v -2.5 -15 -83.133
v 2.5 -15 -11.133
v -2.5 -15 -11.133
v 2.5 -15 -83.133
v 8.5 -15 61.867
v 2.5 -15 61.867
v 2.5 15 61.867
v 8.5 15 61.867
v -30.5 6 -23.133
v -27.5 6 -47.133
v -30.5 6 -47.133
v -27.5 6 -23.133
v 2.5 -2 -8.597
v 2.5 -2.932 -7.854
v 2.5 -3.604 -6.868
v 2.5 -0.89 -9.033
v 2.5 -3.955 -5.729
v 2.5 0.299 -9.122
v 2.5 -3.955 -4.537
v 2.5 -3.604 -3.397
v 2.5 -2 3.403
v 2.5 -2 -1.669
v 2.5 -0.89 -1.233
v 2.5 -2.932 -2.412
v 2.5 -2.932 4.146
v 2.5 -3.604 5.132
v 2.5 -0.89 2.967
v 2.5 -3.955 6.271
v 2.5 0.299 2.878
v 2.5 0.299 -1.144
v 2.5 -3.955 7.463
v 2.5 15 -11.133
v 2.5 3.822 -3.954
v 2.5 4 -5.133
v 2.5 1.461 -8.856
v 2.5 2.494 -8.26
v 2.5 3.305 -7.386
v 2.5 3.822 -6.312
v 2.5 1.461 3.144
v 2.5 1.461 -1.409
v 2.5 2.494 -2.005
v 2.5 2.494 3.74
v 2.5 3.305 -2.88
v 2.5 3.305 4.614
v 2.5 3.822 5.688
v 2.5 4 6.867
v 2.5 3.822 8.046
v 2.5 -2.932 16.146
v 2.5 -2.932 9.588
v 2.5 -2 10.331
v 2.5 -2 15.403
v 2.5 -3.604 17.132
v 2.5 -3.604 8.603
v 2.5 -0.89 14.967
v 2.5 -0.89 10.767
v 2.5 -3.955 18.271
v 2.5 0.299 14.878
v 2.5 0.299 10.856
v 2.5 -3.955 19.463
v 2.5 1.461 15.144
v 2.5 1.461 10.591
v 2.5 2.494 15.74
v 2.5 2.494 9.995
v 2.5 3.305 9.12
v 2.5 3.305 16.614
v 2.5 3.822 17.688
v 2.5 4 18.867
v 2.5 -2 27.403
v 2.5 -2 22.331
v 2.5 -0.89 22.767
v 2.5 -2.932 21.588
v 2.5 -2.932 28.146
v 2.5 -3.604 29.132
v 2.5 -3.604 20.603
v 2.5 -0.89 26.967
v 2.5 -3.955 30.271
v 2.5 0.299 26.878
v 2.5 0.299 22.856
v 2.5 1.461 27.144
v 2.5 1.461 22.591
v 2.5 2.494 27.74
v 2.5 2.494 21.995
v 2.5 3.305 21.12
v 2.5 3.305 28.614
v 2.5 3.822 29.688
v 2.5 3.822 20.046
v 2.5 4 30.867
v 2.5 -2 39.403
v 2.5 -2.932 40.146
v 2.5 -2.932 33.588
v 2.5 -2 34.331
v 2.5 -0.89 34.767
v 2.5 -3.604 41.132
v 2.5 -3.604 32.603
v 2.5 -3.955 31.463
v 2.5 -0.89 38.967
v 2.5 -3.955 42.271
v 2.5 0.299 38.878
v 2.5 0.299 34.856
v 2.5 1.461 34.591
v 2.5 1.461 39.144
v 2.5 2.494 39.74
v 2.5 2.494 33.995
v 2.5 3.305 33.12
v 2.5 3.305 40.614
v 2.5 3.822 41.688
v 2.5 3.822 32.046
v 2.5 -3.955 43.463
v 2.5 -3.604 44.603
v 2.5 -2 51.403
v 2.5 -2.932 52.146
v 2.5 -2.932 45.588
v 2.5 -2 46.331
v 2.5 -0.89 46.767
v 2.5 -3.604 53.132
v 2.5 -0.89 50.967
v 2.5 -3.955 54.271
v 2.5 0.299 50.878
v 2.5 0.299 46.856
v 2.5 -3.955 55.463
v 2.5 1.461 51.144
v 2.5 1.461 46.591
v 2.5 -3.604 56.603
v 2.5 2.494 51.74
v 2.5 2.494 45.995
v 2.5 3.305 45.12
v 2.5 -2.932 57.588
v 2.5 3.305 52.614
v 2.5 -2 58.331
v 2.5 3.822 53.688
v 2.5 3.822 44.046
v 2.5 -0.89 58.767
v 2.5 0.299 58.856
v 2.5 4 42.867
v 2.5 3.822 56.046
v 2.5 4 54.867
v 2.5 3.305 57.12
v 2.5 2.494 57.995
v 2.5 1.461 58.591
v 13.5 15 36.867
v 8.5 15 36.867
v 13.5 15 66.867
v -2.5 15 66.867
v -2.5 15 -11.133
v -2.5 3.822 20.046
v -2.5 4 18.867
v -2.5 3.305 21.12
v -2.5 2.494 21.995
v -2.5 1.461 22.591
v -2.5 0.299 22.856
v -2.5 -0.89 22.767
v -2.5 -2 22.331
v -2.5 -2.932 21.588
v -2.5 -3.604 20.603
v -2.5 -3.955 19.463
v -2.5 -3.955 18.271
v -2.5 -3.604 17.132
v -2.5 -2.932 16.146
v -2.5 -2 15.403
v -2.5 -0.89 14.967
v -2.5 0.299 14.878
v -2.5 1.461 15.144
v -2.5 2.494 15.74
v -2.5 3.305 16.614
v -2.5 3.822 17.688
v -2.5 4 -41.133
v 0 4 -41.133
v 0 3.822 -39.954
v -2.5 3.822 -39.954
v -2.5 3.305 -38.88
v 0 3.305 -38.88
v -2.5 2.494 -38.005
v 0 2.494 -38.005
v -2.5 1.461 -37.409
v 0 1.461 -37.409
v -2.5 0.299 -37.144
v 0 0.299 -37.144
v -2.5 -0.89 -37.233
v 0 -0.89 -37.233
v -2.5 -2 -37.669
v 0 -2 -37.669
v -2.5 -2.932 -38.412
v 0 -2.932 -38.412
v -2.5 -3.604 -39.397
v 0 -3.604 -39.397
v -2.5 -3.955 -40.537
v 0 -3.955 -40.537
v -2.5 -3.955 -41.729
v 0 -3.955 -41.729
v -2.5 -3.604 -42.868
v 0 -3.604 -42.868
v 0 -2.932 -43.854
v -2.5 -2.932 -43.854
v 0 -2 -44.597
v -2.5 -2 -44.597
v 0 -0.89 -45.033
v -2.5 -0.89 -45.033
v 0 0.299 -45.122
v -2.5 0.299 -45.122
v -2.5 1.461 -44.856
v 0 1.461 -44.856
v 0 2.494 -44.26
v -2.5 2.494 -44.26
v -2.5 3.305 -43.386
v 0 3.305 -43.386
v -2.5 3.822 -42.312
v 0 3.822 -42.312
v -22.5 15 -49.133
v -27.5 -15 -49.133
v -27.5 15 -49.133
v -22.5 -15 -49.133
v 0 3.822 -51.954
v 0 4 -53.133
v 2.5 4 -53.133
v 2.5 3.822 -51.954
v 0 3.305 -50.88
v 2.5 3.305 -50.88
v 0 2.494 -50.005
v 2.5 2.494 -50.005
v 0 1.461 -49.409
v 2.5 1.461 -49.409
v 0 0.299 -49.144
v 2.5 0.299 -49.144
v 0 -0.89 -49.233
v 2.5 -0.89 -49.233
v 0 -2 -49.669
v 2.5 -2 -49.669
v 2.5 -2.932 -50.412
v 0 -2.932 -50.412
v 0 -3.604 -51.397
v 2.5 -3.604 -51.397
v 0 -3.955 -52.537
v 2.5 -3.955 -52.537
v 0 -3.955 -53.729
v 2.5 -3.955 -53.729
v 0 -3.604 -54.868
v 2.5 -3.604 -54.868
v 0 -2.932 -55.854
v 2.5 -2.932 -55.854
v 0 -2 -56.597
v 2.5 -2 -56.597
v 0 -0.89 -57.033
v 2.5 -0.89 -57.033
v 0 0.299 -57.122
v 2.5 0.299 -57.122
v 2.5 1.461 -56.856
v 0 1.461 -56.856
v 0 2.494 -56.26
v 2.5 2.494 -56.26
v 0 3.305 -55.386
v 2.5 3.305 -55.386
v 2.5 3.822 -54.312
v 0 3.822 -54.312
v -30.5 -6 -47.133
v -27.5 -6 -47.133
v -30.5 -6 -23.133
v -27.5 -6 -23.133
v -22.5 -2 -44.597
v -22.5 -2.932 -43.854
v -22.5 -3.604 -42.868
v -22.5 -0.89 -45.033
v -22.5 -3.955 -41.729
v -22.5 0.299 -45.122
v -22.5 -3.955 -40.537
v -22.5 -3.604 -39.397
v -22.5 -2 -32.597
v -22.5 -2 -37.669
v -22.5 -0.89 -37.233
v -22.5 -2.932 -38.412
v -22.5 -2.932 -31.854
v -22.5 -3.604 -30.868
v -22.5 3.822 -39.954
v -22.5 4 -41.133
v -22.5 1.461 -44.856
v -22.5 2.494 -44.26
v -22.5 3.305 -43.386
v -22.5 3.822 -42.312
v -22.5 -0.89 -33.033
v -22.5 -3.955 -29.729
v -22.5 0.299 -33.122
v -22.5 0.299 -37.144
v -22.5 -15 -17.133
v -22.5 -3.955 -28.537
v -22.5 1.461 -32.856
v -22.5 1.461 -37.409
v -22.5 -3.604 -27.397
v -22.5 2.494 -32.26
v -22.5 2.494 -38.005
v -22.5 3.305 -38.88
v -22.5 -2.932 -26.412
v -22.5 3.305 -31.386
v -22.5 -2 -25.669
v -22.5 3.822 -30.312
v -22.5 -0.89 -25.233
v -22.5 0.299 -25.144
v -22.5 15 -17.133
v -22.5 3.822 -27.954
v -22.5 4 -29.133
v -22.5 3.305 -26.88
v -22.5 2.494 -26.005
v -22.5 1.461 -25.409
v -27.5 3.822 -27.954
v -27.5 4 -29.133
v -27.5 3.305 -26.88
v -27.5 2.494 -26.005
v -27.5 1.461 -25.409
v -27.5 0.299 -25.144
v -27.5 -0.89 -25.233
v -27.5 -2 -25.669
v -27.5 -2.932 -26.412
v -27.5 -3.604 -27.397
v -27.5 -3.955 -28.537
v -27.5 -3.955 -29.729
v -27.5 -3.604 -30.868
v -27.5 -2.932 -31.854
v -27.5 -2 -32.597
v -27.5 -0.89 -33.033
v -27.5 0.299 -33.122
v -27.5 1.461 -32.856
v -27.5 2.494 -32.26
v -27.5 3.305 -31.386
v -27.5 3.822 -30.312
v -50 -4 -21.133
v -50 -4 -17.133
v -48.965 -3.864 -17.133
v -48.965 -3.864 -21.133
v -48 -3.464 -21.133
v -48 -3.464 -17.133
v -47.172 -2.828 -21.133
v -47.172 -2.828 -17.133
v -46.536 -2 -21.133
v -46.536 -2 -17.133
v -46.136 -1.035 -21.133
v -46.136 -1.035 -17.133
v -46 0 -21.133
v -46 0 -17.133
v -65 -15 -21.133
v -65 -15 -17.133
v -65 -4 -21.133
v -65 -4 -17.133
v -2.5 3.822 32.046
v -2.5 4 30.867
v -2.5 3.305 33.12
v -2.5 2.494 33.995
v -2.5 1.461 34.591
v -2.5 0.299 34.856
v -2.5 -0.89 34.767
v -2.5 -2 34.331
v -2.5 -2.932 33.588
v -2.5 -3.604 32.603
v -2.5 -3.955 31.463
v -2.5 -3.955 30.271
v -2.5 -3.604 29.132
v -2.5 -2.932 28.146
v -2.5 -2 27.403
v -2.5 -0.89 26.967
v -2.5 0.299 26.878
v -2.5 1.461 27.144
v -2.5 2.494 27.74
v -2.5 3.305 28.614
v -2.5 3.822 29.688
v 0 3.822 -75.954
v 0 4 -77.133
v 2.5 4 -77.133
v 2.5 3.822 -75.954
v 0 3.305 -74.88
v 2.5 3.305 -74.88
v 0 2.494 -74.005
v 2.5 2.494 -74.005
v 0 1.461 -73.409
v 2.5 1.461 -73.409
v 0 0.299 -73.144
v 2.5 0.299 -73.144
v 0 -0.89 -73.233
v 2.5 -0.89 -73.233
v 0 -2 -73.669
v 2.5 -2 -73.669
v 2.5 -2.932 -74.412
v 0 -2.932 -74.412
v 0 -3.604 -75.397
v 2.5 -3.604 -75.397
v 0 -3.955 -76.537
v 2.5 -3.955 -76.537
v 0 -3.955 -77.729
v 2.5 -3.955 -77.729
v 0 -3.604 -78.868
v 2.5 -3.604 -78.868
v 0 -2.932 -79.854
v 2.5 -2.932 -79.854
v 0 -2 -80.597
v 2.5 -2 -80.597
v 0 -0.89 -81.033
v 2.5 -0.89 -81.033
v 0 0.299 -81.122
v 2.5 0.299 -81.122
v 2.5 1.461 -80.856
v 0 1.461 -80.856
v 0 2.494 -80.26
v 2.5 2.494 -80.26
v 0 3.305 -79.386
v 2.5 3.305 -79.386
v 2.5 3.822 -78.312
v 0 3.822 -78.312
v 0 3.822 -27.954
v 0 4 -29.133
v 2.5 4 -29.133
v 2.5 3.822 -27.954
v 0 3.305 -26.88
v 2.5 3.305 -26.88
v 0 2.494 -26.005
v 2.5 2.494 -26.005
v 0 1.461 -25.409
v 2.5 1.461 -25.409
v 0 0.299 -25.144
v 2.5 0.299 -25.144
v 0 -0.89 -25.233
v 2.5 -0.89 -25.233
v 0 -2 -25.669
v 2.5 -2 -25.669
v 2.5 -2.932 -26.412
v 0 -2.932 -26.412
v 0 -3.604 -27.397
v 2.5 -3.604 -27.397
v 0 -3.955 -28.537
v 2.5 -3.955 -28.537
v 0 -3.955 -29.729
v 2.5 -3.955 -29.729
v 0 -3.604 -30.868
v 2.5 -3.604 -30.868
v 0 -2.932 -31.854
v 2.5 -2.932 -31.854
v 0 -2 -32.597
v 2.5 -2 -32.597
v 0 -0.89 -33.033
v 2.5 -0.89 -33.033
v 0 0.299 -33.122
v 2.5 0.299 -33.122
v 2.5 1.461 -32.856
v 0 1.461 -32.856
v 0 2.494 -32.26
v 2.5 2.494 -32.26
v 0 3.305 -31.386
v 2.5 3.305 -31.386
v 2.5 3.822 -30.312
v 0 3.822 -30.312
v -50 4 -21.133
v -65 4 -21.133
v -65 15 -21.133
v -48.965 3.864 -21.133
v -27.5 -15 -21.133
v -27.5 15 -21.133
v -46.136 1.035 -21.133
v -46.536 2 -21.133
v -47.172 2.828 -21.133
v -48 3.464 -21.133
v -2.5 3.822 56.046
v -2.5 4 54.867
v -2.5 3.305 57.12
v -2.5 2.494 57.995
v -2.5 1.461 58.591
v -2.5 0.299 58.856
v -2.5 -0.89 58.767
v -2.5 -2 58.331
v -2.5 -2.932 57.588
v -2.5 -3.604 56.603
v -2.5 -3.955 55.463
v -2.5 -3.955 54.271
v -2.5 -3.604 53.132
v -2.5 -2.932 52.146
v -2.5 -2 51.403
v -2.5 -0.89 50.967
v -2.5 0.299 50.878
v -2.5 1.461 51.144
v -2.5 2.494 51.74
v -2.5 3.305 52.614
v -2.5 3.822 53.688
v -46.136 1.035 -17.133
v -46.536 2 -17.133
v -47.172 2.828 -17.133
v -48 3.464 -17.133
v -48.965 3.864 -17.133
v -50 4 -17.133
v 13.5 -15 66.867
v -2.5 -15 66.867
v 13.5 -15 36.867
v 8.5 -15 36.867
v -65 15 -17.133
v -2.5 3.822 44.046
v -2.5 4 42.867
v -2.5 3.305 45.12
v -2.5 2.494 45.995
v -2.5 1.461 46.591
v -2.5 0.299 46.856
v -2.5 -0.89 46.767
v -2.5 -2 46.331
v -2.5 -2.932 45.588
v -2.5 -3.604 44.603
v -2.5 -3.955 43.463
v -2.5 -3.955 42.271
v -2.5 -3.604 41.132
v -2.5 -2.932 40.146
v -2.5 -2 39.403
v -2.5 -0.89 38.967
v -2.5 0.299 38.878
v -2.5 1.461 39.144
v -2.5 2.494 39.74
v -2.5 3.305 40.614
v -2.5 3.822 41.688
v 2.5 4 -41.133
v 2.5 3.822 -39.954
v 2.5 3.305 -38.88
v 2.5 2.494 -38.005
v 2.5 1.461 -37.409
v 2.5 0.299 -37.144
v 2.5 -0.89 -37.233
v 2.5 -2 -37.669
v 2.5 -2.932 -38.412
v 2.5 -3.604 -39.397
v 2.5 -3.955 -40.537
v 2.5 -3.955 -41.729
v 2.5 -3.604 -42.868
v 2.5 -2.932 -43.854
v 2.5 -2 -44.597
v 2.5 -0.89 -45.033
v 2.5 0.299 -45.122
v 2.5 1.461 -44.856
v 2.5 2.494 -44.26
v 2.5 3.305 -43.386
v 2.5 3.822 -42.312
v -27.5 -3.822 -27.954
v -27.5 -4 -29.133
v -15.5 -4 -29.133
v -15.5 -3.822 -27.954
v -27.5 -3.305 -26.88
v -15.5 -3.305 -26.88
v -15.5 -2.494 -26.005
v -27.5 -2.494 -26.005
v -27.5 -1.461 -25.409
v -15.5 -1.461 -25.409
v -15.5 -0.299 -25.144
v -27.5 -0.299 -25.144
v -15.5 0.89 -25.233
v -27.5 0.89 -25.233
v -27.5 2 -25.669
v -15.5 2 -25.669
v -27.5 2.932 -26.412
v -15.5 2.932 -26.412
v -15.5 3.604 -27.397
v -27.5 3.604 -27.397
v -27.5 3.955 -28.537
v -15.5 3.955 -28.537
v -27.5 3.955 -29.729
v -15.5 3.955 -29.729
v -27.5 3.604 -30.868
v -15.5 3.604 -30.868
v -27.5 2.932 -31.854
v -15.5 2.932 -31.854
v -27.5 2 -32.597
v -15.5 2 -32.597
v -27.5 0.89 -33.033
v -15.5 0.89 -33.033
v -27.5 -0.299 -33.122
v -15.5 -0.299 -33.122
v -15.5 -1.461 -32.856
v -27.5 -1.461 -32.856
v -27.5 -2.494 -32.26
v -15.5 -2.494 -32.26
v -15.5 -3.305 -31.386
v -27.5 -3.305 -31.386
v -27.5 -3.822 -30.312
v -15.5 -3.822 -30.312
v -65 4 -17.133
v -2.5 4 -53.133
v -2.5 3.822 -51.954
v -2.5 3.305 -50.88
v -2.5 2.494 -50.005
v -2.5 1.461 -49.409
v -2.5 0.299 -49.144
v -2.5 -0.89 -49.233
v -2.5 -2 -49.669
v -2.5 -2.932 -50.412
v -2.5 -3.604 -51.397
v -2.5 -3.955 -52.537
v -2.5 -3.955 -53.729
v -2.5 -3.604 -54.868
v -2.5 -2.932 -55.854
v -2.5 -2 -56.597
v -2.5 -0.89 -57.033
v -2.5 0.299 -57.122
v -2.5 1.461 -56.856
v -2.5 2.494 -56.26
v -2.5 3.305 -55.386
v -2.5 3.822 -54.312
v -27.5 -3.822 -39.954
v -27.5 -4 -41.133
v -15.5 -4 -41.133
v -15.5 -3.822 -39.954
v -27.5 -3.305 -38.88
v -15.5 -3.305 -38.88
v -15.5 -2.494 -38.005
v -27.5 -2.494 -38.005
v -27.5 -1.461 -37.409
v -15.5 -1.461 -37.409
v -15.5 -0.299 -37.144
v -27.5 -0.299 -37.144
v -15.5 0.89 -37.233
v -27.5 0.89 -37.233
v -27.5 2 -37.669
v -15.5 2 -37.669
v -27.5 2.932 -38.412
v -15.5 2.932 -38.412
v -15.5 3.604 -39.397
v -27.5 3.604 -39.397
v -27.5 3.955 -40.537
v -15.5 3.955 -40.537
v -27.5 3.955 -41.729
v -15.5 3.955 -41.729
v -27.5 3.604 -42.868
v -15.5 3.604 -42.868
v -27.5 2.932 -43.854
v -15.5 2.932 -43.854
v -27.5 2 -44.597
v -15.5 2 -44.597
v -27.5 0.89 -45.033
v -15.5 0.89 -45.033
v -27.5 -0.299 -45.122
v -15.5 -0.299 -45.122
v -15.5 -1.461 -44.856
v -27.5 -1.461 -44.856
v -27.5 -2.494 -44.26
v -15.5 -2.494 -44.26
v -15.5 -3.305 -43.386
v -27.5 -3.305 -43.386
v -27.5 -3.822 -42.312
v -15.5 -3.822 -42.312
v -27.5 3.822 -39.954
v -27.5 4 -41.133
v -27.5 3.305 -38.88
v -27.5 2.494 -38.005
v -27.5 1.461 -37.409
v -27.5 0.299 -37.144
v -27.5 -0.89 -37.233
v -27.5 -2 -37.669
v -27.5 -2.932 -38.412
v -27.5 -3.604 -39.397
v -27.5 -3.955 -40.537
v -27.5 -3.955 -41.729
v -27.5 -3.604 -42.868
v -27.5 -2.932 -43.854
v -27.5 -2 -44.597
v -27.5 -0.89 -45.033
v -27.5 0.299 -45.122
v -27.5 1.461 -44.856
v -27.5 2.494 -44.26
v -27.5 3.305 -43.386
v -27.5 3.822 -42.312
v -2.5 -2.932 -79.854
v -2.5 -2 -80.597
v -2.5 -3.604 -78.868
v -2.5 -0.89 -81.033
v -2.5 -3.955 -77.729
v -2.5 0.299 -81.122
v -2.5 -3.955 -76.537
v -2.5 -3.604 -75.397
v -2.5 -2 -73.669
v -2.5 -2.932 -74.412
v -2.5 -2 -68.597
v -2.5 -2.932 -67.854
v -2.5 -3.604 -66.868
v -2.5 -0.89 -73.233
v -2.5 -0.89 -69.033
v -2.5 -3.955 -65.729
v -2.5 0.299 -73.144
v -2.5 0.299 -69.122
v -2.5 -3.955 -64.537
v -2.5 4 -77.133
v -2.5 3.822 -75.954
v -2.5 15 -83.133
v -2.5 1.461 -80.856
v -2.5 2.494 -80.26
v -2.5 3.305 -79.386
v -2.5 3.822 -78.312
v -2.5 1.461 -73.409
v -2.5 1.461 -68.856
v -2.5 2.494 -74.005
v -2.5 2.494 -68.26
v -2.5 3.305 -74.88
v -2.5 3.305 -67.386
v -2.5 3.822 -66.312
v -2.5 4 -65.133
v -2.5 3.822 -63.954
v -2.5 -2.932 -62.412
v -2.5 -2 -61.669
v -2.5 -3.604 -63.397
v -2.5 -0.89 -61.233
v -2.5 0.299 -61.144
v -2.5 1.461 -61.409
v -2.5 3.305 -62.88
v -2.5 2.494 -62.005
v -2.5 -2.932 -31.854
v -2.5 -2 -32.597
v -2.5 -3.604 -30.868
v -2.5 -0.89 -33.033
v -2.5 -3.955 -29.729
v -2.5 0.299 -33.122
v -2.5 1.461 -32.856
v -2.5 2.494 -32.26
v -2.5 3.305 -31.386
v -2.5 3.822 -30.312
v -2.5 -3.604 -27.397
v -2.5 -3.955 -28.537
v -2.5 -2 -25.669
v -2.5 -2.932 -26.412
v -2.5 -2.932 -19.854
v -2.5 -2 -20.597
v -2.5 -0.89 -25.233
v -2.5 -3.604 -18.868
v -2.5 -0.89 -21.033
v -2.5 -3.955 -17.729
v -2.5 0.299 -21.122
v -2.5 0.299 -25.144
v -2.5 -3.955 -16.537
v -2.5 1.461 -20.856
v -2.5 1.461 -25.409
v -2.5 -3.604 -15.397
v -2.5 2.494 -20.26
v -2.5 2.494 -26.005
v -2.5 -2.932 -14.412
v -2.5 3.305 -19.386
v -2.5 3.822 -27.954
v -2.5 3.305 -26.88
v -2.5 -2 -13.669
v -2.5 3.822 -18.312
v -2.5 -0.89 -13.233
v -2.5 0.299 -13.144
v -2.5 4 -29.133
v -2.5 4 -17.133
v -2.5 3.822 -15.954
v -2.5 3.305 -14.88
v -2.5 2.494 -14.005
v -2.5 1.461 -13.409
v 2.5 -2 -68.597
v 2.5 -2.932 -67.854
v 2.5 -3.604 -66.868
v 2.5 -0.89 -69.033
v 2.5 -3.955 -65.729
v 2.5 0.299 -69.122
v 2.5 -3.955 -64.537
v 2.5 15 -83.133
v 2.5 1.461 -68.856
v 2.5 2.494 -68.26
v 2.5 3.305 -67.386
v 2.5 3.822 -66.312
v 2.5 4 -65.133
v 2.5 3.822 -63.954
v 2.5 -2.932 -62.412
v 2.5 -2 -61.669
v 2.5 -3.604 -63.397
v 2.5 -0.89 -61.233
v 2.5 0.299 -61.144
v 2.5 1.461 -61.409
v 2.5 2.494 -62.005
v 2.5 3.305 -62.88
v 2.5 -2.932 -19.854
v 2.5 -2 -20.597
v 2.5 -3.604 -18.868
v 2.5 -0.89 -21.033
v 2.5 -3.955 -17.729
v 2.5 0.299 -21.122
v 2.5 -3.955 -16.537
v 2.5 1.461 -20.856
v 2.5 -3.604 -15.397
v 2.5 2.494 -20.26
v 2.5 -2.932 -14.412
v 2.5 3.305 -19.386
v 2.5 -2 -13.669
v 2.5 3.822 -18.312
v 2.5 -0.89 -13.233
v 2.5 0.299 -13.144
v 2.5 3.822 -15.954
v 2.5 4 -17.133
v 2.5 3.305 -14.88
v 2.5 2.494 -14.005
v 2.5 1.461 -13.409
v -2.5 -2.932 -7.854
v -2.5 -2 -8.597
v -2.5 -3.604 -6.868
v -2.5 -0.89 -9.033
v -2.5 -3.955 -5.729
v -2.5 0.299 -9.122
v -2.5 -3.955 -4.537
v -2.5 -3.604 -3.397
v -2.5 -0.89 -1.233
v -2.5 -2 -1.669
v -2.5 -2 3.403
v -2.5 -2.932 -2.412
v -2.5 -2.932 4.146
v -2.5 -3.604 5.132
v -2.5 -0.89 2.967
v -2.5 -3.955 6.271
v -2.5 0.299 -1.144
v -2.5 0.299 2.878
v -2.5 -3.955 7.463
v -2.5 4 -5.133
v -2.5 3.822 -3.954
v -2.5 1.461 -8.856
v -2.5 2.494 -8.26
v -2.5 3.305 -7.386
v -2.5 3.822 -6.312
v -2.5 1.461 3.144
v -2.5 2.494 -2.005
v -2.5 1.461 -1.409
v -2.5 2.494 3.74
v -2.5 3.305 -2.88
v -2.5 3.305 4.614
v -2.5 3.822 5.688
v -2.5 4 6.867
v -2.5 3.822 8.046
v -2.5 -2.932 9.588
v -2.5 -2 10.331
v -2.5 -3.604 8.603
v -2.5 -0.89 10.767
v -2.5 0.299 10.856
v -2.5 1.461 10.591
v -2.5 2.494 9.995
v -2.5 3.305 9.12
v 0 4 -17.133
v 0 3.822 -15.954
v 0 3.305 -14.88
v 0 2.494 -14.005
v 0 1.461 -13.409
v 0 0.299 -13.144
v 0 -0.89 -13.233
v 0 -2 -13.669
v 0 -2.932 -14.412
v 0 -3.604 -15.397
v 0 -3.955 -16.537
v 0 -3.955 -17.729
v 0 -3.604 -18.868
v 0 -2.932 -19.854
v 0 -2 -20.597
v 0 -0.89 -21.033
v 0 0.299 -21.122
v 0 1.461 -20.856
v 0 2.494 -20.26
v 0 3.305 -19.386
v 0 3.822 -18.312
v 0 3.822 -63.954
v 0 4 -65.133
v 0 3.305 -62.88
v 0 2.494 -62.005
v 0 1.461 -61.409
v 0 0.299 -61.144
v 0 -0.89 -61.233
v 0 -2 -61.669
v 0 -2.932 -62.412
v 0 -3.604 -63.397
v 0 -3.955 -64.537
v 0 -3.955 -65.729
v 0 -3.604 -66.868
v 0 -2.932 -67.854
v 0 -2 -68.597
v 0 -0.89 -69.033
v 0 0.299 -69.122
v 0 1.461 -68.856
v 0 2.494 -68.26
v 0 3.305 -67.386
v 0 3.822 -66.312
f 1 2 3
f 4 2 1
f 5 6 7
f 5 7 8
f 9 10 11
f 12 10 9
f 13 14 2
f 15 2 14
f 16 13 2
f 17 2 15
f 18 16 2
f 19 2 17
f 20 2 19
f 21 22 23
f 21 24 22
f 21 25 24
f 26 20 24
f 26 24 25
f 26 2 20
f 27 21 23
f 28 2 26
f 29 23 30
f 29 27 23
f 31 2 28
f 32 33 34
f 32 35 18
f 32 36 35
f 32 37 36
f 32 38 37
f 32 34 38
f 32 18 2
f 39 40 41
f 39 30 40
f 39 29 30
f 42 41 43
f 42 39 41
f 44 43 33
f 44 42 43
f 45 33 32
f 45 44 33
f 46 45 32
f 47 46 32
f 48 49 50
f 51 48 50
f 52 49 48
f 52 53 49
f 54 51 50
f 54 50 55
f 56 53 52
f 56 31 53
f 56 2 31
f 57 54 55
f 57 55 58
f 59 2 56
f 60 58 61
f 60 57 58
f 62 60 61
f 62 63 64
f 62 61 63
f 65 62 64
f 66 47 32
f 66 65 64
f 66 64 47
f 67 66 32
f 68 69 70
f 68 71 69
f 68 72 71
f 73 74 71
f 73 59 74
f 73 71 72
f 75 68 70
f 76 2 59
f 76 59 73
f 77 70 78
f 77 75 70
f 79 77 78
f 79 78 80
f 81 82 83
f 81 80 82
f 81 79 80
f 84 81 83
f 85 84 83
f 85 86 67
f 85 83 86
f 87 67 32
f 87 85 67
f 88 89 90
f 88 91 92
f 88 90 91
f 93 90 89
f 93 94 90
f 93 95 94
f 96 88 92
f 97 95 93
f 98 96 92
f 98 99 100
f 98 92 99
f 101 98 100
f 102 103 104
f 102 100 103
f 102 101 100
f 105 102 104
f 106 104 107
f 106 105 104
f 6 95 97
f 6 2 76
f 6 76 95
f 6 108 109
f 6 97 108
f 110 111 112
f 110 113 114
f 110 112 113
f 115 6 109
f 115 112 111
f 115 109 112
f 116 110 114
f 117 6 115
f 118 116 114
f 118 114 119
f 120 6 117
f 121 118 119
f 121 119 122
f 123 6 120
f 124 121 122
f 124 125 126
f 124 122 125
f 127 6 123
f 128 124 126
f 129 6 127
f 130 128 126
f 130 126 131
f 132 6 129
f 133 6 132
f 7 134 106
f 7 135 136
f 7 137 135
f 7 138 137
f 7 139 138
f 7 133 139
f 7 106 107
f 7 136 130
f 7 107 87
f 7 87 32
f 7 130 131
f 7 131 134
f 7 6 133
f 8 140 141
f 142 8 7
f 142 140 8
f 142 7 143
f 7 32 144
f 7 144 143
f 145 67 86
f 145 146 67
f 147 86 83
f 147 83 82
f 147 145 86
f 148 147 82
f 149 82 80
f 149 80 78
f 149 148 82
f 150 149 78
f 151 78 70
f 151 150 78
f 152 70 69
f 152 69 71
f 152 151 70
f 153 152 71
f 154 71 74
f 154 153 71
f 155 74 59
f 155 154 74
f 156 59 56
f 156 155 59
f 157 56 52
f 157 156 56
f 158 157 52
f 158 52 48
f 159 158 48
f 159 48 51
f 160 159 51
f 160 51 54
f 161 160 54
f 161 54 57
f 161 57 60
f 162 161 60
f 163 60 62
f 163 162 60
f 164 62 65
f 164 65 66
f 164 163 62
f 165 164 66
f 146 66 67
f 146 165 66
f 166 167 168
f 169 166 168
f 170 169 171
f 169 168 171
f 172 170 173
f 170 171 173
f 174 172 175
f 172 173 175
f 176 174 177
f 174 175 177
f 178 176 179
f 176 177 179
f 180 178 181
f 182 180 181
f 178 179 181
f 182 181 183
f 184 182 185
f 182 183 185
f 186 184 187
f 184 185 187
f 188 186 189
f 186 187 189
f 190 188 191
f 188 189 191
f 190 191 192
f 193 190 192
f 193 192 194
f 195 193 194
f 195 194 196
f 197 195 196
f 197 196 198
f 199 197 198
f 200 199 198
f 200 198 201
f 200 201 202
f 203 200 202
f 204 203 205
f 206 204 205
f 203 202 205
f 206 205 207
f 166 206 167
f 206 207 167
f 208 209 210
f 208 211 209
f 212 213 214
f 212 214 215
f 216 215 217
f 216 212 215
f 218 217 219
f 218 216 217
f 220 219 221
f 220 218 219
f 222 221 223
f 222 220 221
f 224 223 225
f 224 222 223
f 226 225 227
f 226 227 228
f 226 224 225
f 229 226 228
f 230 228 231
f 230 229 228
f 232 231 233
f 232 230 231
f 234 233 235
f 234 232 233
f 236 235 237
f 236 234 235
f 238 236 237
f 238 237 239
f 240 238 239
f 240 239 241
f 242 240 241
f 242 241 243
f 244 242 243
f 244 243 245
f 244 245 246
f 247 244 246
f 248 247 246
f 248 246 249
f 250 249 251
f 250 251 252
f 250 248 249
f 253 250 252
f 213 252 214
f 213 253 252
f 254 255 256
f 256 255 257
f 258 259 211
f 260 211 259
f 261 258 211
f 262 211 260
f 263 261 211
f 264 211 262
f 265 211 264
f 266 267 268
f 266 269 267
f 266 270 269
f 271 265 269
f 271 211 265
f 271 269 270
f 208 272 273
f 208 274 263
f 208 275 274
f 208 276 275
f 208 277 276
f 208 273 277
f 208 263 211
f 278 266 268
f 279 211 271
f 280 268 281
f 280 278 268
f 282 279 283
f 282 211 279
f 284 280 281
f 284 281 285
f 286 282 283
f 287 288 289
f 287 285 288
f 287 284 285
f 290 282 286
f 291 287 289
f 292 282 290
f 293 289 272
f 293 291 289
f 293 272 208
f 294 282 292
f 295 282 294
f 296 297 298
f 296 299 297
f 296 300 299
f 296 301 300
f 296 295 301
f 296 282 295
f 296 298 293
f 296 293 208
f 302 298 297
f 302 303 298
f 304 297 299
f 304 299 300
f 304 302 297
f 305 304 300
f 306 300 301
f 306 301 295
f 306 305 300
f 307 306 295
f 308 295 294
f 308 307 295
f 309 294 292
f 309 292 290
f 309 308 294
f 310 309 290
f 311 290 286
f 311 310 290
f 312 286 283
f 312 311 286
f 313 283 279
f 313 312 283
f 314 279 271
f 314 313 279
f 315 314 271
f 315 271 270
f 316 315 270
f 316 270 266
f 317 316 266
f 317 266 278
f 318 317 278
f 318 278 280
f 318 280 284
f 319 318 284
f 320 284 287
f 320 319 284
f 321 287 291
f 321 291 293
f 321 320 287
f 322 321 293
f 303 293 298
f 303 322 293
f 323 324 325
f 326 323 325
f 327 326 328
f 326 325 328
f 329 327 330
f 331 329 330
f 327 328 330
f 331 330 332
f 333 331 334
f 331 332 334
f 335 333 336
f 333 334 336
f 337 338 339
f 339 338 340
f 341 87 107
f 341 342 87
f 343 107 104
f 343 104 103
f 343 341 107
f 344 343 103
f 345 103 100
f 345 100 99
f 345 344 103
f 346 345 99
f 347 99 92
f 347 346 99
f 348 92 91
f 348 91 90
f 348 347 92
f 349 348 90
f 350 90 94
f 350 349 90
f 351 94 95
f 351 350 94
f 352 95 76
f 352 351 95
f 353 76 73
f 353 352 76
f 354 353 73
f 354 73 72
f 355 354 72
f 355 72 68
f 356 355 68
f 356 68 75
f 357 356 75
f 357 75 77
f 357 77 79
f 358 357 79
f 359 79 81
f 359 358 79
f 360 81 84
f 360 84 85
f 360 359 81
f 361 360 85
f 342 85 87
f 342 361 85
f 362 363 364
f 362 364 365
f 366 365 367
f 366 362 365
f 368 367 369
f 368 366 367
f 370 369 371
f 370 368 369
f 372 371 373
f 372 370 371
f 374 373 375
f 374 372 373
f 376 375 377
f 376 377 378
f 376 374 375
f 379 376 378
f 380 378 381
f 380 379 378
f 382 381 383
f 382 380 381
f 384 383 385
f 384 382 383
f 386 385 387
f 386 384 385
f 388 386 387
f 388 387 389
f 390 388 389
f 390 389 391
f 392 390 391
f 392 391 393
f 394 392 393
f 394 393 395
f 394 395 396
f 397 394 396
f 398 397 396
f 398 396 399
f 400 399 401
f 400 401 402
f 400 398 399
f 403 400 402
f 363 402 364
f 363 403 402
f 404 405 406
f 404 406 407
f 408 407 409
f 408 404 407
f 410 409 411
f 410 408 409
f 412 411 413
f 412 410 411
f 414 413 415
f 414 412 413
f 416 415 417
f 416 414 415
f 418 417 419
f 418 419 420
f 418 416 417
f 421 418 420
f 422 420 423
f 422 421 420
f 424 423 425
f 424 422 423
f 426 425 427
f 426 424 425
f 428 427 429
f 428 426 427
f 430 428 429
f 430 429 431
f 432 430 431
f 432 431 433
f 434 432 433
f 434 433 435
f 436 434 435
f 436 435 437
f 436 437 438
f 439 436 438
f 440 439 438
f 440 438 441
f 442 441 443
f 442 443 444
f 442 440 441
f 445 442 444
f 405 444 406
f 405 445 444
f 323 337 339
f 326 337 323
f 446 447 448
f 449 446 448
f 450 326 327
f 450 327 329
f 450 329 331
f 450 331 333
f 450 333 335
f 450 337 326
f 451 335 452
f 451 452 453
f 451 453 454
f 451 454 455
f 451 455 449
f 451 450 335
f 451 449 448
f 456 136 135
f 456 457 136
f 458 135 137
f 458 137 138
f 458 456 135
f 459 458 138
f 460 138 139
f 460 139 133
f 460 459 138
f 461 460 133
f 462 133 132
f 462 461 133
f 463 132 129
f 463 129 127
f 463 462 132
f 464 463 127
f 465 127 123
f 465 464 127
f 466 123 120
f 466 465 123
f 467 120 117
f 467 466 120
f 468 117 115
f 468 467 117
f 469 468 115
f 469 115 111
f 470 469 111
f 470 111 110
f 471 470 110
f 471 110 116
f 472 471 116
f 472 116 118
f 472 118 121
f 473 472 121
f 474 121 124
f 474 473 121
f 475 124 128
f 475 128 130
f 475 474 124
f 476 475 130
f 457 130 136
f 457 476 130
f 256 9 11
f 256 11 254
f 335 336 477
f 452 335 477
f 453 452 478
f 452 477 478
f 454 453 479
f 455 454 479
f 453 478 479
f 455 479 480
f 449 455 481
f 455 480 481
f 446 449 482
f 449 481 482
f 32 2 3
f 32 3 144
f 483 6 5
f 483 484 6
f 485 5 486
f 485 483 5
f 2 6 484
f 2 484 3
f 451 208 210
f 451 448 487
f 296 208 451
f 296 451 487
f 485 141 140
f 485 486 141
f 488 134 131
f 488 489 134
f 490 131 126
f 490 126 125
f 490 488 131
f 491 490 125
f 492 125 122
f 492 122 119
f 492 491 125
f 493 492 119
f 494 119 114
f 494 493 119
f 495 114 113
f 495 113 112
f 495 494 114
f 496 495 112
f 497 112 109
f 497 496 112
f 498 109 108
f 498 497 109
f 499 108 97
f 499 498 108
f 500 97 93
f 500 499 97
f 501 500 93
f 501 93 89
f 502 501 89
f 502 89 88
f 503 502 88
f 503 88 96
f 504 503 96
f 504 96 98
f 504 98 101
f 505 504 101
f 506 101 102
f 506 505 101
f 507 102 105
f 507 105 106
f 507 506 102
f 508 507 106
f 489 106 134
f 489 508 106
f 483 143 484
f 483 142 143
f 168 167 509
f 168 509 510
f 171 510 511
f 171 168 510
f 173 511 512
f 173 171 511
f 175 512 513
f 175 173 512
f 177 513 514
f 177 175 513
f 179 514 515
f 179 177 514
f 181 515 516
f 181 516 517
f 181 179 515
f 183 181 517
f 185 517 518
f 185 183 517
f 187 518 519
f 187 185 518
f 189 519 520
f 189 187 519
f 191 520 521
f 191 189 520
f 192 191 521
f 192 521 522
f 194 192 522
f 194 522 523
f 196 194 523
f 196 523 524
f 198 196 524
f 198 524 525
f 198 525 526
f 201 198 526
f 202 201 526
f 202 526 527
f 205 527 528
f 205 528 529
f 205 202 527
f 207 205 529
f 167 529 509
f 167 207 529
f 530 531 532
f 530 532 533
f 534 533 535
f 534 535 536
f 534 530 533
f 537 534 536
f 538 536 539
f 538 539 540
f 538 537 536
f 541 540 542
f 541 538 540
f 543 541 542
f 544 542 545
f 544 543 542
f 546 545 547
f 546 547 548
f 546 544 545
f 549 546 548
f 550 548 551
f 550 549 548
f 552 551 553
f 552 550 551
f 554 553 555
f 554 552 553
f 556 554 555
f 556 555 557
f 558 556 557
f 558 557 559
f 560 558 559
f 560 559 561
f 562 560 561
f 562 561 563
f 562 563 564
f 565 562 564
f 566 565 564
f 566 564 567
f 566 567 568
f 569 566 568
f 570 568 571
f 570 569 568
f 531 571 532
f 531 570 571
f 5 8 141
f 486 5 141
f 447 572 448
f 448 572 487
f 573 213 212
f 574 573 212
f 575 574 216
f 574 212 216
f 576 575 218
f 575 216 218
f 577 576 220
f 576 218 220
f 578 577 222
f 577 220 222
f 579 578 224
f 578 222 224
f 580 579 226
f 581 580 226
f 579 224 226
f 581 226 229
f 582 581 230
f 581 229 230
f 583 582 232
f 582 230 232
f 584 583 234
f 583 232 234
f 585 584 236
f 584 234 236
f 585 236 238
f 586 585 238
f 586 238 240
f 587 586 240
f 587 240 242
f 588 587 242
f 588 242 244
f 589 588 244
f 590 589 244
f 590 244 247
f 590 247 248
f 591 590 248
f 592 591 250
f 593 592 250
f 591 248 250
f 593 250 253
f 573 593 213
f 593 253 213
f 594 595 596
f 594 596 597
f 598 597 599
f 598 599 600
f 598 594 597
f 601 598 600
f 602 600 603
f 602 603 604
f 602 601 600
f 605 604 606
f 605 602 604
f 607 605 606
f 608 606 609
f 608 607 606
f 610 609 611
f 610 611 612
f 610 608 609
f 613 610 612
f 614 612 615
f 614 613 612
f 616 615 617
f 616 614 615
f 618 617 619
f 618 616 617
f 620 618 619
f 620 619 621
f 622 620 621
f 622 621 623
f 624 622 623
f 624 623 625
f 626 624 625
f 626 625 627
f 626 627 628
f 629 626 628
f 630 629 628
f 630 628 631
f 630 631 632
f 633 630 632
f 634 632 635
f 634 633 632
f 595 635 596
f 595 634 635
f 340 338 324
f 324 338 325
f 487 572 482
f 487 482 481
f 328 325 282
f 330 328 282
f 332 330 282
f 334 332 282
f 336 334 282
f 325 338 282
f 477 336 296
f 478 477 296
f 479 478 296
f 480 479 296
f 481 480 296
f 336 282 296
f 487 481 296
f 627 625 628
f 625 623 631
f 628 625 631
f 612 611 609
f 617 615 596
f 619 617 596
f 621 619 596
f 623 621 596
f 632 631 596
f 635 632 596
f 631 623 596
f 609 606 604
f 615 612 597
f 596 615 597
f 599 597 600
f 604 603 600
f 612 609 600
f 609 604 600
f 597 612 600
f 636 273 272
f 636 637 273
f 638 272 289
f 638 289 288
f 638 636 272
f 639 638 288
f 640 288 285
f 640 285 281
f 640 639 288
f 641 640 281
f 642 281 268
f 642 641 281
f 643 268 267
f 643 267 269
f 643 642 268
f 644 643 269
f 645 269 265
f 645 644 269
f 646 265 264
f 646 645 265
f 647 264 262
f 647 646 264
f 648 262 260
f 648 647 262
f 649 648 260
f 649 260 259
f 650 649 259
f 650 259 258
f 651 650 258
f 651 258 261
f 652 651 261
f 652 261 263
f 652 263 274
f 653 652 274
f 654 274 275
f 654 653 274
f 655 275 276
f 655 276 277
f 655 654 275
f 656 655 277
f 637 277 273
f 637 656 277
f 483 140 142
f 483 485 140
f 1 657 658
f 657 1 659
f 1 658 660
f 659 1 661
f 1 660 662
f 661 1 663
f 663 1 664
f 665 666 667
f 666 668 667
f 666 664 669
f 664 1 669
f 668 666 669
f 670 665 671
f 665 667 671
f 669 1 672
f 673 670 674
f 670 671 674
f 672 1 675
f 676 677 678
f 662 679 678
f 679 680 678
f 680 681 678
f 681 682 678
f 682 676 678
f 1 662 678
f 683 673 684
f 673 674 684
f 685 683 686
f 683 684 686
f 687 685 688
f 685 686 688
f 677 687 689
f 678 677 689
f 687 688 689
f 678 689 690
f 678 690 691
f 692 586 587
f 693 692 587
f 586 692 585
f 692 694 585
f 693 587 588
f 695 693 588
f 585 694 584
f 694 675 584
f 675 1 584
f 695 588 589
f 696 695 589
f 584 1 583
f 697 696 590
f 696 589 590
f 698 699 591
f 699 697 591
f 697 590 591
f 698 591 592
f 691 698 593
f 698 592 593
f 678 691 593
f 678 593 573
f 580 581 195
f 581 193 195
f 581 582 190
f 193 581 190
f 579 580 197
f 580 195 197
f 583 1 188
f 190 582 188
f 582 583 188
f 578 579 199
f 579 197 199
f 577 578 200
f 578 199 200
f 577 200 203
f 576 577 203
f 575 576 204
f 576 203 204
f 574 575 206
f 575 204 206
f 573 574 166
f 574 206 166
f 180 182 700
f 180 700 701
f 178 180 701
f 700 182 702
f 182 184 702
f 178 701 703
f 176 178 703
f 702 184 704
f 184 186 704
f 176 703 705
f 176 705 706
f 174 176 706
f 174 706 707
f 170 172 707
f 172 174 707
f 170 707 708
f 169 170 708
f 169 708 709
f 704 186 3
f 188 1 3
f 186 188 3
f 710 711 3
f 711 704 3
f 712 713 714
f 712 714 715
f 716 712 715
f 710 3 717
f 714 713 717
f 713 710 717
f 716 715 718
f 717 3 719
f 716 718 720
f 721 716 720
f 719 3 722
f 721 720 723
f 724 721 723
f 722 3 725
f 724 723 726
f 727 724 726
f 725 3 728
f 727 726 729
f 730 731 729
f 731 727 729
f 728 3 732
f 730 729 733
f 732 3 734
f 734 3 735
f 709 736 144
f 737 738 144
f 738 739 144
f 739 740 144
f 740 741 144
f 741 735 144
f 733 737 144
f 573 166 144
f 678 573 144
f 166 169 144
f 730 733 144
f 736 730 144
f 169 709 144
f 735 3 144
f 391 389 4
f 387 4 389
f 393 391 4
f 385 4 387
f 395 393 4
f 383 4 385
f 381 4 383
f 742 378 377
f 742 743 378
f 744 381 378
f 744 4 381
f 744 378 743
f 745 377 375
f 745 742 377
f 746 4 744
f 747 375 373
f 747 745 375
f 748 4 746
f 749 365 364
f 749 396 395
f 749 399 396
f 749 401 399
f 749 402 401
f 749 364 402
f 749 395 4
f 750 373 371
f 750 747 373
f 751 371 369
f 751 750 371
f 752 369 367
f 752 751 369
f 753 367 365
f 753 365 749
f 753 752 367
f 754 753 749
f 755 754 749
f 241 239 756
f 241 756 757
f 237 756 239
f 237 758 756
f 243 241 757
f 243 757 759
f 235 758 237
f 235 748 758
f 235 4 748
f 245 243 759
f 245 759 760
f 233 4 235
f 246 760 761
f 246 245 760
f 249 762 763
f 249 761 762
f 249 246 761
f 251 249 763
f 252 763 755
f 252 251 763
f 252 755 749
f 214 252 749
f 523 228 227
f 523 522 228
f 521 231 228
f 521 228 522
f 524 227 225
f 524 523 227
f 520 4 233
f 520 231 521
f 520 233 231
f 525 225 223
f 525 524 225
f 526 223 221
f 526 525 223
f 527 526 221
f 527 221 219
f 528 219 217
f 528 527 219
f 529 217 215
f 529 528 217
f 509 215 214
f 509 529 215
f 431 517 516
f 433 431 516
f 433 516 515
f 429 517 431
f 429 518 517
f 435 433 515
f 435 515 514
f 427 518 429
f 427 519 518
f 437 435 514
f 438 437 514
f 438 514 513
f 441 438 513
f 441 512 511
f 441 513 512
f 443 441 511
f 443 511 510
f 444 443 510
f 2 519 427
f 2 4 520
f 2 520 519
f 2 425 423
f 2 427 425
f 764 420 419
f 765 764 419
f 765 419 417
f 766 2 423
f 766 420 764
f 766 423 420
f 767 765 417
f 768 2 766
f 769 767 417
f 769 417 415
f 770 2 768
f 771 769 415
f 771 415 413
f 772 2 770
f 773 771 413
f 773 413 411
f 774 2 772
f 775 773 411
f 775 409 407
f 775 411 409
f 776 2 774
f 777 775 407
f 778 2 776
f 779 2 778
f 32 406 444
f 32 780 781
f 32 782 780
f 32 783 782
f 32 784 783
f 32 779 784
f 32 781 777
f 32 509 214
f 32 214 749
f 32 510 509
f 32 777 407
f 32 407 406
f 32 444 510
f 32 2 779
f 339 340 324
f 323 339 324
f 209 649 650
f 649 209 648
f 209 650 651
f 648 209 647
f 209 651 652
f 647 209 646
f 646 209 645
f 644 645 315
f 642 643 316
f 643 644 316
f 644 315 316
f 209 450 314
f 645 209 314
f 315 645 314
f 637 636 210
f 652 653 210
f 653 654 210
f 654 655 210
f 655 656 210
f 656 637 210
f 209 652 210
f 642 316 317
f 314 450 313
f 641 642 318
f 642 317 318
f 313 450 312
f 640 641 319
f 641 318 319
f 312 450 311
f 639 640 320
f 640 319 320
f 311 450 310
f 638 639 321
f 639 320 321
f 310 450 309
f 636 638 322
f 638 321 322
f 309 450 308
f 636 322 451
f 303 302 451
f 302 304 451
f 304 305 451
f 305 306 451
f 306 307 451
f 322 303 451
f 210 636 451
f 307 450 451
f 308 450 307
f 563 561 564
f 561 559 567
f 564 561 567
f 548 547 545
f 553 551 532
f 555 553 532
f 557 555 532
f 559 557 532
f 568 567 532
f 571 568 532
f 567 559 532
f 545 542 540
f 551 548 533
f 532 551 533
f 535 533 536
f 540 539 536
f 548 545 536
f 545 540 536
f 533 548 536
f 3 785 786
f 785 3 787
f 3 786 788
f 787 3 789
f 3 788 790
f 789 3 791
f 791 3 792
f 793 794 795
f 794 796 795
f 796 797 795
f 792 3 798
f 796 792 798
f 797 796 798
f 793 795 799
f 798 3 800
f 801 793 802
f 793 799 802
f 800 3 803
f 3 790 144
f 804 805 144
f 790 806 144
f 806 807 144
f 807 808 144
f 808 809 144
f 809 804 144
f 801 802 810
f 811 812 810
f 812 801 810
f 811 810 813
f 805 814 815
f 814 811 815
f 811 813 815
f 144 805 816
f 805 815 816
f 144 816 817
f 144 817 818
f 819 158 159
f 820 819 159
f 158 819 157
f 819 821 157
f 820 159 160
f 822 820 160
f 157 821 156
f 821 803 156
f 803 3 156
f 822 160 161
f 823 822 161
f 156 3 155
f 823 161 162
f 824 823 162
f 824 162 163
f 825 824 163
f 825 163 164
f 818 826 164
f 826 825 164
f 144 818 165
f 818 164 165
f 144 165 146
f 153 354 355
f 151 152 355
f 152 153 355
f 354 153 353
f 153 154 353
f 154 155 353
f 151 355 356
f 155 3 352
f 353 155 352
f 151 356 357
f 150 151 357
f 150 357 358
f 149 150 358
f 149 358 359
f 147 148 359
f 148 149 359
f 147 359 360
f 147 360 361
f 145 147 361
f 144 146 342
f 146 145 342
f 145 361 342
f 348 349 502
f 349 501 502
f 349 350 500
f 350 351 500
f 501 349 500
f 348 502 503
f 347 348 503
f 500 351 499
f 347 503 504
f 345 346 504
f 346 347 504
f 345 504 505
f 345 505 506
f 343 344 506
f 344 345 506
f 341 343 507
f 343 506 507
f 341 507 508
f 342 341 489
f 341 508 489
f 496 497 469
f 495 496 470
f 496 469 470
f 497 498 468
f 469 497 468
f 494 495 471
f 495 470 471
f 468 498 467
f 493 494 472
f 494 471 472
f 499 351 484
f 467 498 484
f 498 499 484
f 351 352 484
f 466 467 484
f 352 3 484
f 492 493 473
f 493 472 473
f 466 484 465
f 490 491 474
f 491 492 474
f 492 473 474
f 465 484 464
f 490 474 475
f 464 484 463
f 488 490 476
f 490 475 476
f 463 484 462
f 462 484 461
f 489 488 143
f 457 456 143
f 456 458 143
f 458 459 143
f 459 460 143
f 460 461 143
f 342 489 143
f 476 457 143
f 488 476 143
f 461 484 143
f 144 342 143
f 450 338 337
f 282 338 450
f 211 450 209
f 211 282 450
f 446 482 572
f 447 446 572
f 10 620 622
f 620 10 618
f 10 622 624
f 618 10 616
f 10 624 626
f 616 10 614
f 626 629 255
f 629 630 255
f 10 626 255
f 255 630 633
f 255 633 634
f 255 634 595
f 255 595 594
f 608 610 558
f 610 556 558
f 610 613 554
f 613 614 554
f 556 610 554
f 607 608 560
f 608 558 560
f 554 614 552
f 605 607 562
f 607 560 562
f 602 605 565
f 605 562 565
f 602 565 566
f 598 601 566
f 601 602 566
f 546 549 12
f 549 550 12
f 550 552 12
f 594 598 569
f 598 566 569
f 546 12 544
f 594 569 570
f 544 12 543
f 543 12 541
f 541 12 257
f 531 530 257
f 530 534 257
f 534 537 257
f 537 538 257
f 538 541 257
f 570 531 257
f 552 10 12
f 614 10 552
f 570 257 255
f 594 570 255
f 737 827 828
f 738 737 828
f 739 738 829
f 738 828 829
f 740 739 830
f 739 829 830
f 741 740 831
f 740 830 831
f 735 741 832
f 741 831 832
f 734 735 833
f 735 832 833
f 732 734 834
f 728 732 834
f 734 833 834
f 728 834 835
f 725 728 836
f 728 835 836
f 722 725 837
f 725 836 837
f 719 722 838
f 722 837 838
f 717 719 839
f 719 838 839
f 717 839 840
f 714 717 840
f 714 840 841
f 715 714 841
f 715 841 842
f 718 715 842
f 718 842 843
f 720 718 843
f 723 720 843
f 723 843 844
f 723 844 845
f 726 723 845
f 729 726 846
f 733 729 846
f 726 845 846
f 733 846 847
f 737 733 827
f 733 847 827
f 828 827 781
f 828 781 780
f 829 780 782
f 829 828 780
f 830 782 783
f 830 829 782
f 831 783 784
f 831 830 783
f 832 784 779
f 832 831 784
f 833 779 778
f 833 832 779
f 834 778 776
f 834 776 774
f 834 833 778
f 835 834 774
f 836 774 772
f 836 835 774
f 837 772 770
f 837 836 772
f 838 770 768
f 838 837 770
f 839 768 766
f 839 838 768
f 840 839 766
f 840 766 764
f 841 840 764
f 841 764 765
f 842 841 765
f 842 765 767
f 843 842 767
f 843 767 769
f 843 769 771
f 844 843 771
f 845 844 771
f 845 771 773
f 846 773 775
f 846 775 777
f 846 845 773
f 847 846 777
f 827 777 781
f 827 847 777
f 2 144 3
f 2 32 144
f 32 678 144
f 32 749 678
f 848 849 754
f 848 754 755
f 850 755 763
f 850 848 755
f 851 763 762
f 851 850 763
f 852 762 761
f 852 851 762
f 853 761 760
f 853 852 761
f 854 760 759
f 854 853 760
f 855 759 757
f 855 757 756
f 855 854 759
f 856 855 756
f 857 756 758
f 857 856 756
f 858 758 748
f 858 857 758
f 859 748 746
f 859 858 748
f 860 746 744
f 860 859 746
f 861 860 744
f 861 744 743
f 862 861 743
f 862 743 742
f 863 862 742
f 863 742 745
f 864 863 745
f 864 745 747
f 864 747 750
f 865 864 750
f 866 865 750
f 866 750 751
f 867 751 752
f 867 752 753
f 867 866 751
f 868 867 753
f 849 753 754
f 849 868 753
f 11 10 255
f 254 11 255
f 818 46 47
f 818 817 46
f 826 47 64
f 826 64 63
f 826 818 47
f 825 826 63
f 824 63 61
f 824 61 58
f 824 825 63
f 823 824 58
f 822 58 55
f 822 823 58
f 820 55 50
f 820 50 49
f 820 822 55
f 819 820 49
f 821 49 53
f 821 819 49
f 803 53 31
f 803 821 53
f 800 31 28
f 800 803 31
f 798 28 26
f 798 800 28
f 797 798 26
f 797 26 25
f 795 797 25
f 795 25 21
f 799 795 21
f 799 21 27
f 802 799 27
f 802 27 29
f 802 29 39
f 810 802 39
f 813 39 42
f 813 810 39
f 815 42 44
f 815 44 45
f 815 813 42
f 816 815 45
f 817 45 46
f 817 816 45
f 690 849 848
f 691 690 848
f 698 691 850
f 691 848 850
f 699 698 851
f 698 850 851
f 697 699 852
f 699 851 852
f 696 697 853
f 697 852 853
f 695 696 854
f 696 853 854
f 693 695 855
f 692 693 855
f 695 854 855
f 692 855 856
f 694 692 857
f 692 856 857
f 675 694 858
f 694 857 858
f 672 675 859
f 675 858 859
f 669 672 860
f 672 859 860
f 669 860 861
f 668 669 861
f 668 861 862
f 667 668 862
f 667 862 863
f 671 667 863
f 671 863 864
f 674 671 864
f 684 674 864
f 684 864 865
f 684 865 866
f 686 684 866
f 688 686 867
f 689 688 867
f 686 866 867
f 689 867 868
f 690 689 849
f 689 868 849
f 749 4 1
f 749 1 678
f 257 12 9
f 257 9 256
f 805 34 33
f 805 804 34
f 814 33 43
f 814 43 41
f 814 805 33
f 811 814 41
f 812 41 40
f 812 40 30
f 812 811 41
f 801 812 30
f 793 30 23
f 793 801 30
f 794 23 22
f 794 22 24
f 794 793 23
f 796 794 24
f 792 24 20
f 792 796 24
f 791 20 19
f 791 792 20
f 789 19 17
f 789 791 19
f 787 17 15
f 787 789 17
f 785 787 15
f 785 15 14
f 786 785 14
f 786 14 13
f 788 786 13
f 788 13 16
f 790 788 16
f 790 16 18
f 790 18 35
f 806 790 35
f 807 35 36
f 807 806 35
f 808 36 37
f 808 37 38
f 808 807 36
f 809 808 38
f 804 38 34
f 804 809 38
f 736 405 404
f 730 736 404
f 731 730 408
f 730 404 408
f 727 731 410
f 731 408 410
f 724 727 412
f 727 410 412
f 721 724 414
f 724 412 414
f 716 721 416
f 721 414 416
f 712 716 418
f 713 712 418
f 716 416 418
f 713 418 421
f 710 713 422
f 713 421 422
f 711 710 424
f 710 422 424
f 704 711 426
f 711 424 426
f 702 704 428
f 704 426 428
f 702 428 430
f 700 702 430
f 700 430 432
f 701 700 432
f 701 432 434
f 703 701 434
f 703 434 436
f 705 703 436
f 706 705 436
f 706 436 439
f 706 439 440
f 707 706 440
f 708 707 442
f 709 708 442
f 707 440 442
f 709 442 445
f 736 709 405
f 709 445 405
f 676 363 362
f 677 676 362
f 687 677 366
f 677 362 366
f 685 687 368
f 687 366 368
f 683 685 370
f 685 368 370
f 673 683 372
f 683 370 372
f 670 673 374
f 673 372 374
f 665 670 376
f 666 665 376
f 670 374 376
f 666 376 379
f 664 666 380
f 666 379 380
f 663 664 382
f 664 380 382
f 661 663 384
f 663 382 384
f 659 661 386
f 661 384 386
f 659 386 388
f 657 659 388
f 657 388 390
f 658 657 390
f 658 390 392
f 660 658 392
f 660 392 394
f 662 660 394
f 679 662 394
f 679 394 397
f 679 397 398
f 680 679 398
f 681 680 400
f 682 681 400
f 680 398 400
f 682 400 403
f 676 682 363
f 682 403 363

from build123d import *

# Parameters (mm, degrees)
F0_R           = 4
F1_DEPTH       = 2.5
F1_DEPTH_BACK  = 2.5
F2_DEPTH       = 2.5
F2_DEPTH_BACK  = 2.5
F4_DEPTH       = 15
F4_DEPTH_BACK  = 15
F6_W           = 30
F6_H           = 28
F6_R           = 4
F6_H_2         = 4
F7_DEPTH       = 2.5
F7_DEPTH_BACK  = 2.5
F8_DEPTH       = 40
F10_DEPTH      = 5
F10_DEPTH_BACK = 5
F11_W          = 12
F11_H          = 24
F12_DEPTH      = 3
F11_R          = 4
F13_DEPTH      = 12
F13_DEPTH_BACK = 3
F14_DEPTH      = 5


with BuildPart() as f1:
    # F0 (on Right) → F1 (new body, two sides)
    with BuildSketch(Plane.YZ) as f1_sk:
        Polygon((15, 66.8671875), (-15, 66.8671875), (-15, -11.1328125), (15, -11.1328125), align=None)
        with Locations((0, -5.1328125)):
            Circle(F0_R, mode=Mode.SUBTRACT)
        with Locations((0, 6.8671875)):
            Circle(F0_R, mode=Mode.SUBTRACT)
        with Locations((0, 18.8671875)):
            Circle(F0_R, mode=Mode.SUBTRACT)
        with Locations((0, 30.8671875)):
            Circle(F0_R, mode=Mode.SUBTRACT)
        with Locations((0, 42.8671875)):
            Circle(F0_R, mode=Mode.SUBTRACT)
        with Locations((0, 54.8671875)):
            Circle(F0_R, mode=Mode.SUBTRACT)
    extrude(amount=F1_DEPTH)
    extrude(f1_sk.sketch, amount=-F1_DEPTH_BACK)

    # F3 (on Front) → F4 (join, two sides)
    with BuildSketch(Plane.XZ) as f4_sk:
        Polygon((2.5, 66.8671875), (-2.5, 66.8671875), (-2.5, 61.8671875), (8.5, 61.8671875), (8.5, 36.8671875), (13.5, 36.8671875), (13.5, 61.8671875), (13.5, 66.8671875), (8.5, 66.8671875), align=None)
    extrude(amount=F4_DEPTH)
    extrude(f4_sk.sketch, amount=-F4_DEPTH_BACK)

    # F9 (on face) → F14 (cut)
    with BuildSketch(Plane.XY.offset(-17.1328125)):
        with BuildLine():
            ThreePointArc((-50, -4), (-47.1715728753, -2.8284271247), (-46, 0))
            ThreePointArc((-46, 0), (-47.1715728753, 2.8284271247), (-50, 4))
            ThreePointArc((-50, 4), (-54, 0), (-50, -4))
        make_face()
        with BuildLine():
            ThreePointArc((-50, -4), (-54, 0), (-50, 4))
            Line((-50, 4), (-65, 4))
            Line((-65, 4), (-65, -4))
            Line((-65, -4), (-50, -4))
        make_face()
    extrude(amount=-F14_DEPTH, mode=Mode.SUBTRACT)


with BuildPart() as f2:
    # F0 (on Right) → F2 (new body, two sides)
    with BuildSketch(Plane.YZ) as f2_sk:
        Polygon((15, -11.1328125), (-15, -11.1328125), (-15, -83.1328125), (15, -83.1328125), align=None)
        with Locations((0, -77.1328125)):
            Circle(F0_R, mode=Mode.SUBTRACT)
        with Locations((0, -65.1328125)):
            Circle(F0_R, mode=Mode.SUBTRACT)
        with Locations((0, -53.1328125)):
            Circle(F0_R, mode=Mode.SUBTRACT)
        with Locations((0, -41.1328125)):
            Circle(F0_R, mode=Mode.SUBTRACT)
        with Locations((0, -29.1328125)):
            Circle(F0_R, mode=Mode.SUBTRACT)
        with Locations((0, -17.1328125)):
            Circle(F0_R, mode=Mode.SUBTRACT)
    extrude(amount=F2_DEPTH)
    extrude(f2_sk.sketch, amount=-F2_DEPTH_BACK)


with BuildPart() as f7:
    # F6 (on offset) → F7 (new body, two sides)
    with BuildSketch(Plane.YZ.offset(-25)) as f7_sk:
        with Locations((0, -35.1328125)):
            Rectangle(F6_W, F6_H)
        with Locations((0, -41.1328125)):
            Circle(F6_R, mode=Mode.SUBTRACT)
        with Locations((0, -29.1328125)):
            Circle(F6_R, mode=Mode.SUBTRACT)
        with Locations((0, -19.1328125)):
            Rectangle(F6_W, F6_H_2)
    extrude(amount=F7_DEPTH)
    extrude(f7_sk.sketch, amount=-F7_DEPTH_BACK)

    # F6 (on offset) → F8 (join)
    with BuildSketch(Plane.YZ.offset(-25)):
        with Locations((0, -19.1328125)):
            Rectangle(F6_W, F6_H_2)
    extrude(amount=-F8_DEPTH)

    # F9 (on face) → F10 (cut, two sides)
    with BuildSketch(Plane.XY.offset(-17.1328125)) as f10_sk:
        with BuildLine():
            ThreePointArc((-50, -4), (-47.1715728753, -2.8284271247), (-46, 0))
            ThreePointArc((-46, 0), (-47.1715728753, 2.8284271247), (-50, 4))
            ThreePointArc((-50, 4), (-54, 0), (-50, -4))
        make_face()
        with BuildLine():
            ThreePointArc((-50, -4), (-54, 0), (-50, 4))
            Line((-50, 4), (-65, 4))
            Line((-65, 4), (-65, -4))
            Line((-65, -4), (-50, -4))
        make_face()
    extrude(amount=F10_DEPTH, mode=Mode.SUBTRACT)
    extrude(f10_sk.sketch, amount=-F10_DEPTH_BACK, mode=Mode.SUBTRACT)


with BuildPart() as f12:
    # F11 (on face) → F12 (new body)
    with BuildSketch(Plane(origin=(-27.5, 0, 0), x_dir=(0, -1, 0), z_dir=(-1, 0, 0))):
        with Locations((0, -35.1328125)):
            Rectangle(F11_W, F11_H)
    extrude(amount=F12_DEPTH)

    # F11 (on face) → F13 (join, two sides)
    with BuildSketch(Plane(origin=(-27.5, 0, 0), x_dir=(0, -1, 0), z_dir=(-1, 0, 0))) as f13_sk:
        with Locations((0, -29.1328125)):
            Circle(F11_R)
        with Locations((0, -41.1328125)):
            Circle(F11_R)
    extrude(amount=-F13_DEPTH)
    extrude(f13_sk.sketch, amount=F13_DEPTH_BACK)


solid = Compound([f1.part, f2.part, f7.part, f12.part])
